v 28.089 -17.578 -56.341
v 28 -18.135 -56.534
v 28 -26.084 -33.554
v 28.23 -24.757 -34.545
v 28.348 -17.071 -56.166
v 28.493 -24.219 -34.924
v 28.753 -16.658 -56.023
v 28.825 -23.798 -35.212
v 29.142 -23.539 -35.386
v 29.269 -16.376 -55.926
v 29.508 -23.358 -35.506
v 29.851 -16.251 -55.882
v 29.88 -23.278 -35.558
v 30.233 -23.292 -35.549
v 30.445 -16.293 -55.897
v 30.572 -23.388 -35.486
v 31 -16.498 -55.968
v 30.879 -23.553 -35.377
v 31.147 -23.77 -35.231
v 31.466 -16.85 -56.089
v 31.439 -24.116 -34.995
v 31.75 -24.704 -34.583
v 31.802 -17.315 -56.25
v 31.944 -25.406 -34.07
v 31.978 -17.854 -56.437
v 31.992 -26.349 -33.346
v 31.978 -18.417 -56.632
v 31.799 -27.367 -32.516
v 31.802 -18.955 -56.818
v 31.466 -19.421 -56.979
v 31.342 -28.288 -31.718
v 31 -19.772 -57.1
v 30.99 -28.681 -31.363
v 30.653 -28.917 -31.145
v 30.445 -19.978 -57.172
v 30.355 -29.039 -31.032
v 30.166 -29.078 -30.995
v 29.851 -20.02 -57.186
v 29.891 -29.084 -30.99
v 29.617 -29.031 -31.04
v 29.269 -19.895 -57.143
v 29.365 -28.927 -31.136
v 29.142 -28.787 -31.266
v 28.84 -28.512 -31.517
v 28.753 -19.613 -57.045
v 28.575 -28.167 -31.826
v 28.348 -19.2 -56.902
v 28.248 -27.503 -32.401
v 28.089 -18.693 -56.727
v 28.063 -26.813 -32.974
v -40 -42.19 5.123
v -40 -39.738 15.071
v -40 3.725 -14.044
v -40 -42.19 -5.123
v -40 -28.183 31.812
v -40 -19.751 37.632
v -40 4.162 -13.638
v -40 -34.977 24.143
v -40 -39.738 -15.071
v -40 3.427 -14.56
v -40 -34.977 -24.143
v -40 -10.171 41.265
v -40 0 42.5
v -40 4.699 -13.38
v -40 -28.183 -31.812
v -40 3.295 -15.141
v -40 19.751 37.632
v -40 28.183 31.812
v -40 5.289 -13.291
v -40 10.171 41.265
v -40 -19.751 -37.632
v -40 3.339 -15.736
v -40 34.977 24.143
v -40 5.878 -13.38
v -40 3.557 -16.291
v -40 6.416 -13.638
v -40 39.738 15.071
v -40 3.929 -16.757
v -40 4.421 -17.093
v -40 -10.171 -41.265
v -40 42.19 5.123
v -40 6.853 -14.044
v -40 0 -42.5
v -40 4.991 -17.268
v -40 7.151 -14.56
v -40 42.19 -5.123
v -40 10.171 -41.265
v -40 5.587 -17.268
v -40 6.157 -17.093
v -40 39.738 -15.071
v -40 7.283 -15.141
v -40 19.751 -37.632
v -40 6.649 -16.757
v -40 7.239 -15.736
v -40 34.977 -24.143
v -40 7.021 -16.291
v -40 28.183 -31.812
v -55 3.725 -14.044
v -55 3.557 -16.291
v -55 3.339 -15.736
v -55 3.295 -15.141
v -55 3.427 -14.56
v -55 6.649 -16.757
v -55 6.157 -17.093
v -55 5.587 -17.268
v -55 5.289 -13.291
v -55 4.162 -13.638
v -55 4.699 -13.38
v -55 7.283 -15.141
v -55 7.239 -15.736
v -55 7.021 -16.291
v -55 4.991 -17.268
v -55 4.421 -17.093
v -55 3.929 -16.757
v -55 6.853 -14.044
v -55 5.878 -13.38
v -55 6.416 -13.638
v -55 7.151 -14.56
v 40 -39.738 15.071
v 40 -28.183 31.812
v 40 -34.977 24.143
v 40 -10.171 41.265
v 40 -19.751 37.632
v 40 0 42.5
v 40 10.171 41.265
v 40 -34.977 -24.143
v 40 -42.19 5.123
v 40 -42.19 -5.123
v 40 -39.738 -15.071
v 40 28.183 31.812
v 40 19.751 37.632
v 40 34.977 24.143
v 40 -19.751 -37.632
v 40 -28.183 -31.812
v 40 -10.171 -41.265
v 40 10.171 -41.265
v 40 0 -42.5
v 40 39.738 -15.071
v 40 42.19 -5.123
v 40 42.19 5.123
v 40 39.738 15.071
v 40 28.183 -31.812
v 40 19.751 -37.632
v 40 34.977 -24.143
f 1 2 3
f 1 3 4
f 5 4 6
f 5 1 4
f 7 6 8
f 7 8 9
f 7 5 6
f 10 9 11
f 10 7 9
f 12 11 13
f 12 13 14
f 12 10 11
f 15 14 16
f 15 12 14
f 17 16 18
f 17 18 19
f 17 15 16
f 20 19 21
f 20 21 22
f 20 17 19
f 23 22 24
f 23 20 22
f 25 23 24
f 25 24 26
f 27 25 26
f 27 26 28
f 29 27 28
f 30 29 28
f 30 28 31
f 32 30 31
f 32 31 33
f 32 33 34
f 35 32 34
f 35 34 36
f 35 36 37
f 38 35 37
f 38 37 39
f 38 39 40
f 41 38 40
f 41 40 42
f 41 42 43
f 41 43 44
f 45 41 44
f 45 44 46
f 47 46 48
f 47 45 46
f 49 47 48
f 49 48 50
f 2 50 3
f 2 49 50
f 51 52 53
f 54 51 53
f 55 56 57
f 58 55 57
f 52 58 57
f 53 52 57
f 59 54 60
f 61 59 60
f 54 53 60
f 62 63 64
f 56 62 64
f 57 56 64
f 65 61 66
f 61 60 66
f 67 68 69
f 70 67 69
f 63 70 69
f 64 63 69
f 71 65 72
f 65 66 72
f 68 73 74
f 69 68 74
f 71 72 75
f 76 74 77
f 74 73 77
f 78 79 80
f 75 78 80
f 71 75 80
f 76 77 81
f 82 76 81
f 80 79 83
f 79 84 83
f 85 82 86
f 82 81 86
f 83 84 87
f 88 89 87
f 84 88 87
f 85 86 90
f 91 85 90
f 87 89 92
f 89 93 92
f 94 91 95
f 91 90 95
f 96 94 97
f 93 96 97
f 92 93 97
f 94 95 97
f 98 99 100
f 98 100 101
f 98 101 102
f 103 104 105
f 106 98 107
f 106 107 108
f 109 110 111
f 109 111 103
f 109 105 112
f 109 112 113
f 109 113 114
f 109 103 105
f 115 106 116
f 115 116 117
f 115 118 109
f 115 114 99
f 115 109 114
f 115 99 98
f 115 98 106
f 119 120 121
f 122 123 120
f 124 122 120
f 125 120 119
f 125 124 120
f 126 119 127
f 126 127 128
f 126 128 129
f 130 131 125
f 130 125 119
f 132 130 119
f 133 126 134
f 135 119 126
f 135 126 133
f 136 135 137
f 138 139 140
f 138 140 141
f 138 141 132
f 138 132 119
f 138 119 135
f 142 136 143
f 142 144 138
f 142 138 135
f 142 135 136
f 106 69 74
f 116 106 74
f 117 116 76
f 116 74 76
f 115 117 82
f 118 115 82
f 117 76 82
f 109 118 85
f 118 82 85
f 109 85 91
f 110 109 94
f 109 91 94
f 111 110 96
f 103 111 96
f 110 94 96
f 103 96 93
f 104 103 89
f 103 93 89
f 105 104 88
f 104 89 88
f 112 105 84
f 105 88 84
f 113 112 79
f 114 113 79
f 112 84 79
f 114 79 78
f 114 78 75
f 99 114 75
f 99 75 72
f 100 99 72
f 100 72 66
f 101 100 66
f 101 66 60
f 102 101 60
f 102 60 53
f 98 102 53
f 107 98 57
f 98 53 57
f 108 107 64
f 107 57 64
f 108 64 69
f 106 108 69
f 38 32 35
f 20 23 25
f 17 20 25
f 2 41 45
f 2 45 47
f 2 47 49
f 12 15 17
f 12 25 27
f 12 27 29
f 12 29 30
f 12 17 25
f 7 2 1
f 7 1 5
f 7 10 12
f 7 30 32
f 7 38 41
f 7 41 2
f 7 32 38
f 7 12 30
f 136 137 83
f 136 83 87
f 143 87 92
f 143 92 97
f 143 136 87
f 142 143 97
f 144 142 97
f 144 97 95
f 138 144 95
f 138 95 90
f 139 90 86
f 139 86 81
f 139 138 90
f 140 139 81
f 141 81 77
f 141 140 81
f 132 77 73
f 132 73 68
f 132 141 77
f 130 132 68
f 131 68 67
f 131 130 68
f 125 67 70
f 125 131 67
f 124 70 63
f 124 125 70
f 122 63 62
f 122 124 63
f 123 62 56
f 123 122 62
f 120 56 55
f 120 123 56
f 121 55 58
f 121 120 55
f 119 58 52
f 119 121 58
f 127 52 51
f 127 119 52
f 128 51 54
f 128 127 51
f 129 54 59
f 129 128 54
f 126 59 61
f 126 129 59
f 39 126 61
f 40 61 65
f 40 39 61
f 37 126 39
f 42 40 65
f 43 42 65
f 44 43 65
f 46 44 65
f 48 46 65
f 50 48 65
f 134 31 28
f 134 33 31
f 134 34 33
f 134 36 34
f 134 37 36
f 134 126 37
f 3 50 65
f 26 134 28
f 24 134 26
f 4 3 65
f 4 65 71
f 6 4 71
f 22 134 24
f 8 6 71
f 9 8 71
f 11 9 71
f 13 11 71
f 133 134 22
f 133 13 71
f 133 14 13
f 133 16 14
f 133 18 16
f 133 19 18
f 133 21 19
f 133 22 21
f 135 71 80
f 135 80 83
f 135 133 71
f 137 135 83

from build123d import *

# Parameters (mm, degrees)
SKETCH1_R           = 42.5
BOSS_EXTRUDE1_DEPTH = 40
SKETCH2_R           = 2
BOSS_EXTRUDE2_DEPTH = 15
SKETCH3_R           = 2
BOSS_EXTRUDE3_DEPTH = 30


with BuildPart() as part:
    # Sketch1 → Boss-Extrude1 (new body, symmetric)
    with BuildSketch(Plane(origin=(0, 0, 0), x_dir=(0, 0, -1), z_dir=(1, 0, 0))):
        Circle(SKETCH1_R)
    extrude(amount=BOSS_EXTRUDE1_DEPTH, both=True)

    # Sketch2 → Boss-Extrude2 (add)
    with BuildSketch(Plane.ZY.offset(40)):
        with Locations((-15.290703643, 5.288943408)):
            Circle(SKETCH2_R)
    extrude(amount=BOSS_EXTRUDE2_DEPTH)

    # Sketch3 → Boss-Extrude3 (add)
    with BuildSketch(Plane(origin=(0, 15.527284441, -44.890460433), x_dir=(-1, 0, 0), z_dir=(0, 0.326890199, -0.945062325))):
        with Locations((-30, -35.619517122)):
            Circle(SKETCH3_R)
    extrude(amount=-BOSS_EXTRUDE3_DEPTH)


solid = part.part
